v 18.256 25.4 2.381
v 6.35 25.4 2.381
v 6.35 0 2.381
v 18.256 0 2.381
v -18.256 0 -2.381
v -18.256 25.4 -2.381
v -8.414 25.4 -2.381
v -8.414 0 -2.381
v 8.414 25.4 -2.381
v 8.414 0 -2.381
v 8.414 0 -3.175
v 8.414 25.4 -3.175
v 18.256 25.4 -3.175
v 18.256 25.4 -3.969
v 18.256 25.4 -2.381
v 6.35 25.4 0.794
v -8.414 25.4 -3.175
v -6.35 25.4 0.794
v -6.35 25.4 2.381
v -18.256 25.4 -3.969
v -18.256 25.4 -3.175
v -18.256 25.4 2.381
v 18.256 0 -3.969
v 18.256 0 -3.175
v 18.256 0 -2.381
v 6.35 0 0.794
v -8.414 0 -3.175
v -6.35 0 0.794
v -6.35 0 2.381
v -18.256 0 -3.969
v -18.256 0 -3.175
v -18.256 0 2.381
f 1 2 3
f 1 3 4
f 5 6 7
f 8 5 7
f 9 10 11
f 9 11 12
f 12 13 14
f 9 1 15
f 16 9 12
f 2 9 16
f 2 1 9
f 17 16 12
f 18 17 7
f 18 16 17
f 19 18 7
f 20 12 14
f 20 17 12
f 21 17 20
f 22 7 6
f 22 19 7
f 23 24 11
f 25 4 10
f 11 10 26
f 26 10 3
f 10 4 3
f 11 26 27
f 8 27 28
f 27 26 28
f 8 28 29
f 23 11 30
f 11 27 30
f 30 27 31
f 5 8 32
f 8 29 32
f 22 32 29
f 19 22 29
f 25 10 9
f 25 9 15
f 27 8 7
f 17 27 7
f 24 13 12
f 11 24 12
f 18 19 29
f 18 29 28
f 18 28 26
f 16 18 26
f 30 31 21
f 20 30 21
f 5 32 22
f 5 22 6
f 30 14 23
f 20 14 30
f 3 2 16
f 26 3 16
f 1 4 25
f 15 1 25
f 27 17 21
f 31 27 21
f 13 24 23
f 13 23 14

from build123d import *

# Parameters (mm, degrees)
SKETCH1_W           = 36.5125
SKETCH1_H           = 4.7625
BOSS_EXTRUDE1_DEPTH = 25.4
SKETCH2_W           = 12.7
SKETCH2_H           = 1.5875
CUT_EXTRUDE1_DEPTH  = 25.4
SKETCH3_W           = 16.8275
SKETCH3_H           = 25.4
BOSS_EXTRUDE2_DEPTH = 0.79375
SKETCH4_W           = 36.5125
SKETCH4_H           = 25.4
BOSS_EXTRUDE3_DEPTH = 0.79375


with BuildPart() as part:
    # Sketch1 → Boss-Extrude1 (new body)
    with BuildSketch(Plane(origin=(0, 0, 0), x_dir=(1, 0, 0), z_dir=(0, 1, 0))):
        Rectangle(SKETCH1_W, SKETCH1_H)
    extrude(amount=BOSS_EXTRUDE1_DEPTH)

    # Sketch2 → Cut-Extrude1 (cut)
    with BuildSketch(Plane(origin=(0, 25.4, 0), x_dir=(1, 0, 0), z_dir=(0, 1, 0))):
        with Locations((0, -1.5875)):
            Rectangle(SKETCH2_W, SKETCH2_H)
    extrude(amount=-CUT_EXTRUDE1_DEPTH, mode=Mode.SUBTRACT)

    # Sketch3 → Boss-Extrude2 (add)
    with BuildSketch(Plane(origin=(0, 0, -2.38125), x_dir=(-1, 0, 0), z_dir=(0, 0, -1))):
        with Locations((0, 12.7)):
            Rectangle(SKETCH3_W, SKETCH3_H)
    extrude(amount=BOSS_EXTRUDE2_DEPTH)

    # Sketch4 → Boss-Extrude3 (add)
    with BuildSketch(Plane(origin=(0, 0, -3.175), x_dir=(-1, 0, 0), z_dir=(0, 0, -1))):
        with Locations((0, 12.7)):
            Rectangle(SKETCH4_W, SKETCH4_H)
    extrude(amount=BOSS_EXTRUDE3_DEPTH)


solid = part.part
